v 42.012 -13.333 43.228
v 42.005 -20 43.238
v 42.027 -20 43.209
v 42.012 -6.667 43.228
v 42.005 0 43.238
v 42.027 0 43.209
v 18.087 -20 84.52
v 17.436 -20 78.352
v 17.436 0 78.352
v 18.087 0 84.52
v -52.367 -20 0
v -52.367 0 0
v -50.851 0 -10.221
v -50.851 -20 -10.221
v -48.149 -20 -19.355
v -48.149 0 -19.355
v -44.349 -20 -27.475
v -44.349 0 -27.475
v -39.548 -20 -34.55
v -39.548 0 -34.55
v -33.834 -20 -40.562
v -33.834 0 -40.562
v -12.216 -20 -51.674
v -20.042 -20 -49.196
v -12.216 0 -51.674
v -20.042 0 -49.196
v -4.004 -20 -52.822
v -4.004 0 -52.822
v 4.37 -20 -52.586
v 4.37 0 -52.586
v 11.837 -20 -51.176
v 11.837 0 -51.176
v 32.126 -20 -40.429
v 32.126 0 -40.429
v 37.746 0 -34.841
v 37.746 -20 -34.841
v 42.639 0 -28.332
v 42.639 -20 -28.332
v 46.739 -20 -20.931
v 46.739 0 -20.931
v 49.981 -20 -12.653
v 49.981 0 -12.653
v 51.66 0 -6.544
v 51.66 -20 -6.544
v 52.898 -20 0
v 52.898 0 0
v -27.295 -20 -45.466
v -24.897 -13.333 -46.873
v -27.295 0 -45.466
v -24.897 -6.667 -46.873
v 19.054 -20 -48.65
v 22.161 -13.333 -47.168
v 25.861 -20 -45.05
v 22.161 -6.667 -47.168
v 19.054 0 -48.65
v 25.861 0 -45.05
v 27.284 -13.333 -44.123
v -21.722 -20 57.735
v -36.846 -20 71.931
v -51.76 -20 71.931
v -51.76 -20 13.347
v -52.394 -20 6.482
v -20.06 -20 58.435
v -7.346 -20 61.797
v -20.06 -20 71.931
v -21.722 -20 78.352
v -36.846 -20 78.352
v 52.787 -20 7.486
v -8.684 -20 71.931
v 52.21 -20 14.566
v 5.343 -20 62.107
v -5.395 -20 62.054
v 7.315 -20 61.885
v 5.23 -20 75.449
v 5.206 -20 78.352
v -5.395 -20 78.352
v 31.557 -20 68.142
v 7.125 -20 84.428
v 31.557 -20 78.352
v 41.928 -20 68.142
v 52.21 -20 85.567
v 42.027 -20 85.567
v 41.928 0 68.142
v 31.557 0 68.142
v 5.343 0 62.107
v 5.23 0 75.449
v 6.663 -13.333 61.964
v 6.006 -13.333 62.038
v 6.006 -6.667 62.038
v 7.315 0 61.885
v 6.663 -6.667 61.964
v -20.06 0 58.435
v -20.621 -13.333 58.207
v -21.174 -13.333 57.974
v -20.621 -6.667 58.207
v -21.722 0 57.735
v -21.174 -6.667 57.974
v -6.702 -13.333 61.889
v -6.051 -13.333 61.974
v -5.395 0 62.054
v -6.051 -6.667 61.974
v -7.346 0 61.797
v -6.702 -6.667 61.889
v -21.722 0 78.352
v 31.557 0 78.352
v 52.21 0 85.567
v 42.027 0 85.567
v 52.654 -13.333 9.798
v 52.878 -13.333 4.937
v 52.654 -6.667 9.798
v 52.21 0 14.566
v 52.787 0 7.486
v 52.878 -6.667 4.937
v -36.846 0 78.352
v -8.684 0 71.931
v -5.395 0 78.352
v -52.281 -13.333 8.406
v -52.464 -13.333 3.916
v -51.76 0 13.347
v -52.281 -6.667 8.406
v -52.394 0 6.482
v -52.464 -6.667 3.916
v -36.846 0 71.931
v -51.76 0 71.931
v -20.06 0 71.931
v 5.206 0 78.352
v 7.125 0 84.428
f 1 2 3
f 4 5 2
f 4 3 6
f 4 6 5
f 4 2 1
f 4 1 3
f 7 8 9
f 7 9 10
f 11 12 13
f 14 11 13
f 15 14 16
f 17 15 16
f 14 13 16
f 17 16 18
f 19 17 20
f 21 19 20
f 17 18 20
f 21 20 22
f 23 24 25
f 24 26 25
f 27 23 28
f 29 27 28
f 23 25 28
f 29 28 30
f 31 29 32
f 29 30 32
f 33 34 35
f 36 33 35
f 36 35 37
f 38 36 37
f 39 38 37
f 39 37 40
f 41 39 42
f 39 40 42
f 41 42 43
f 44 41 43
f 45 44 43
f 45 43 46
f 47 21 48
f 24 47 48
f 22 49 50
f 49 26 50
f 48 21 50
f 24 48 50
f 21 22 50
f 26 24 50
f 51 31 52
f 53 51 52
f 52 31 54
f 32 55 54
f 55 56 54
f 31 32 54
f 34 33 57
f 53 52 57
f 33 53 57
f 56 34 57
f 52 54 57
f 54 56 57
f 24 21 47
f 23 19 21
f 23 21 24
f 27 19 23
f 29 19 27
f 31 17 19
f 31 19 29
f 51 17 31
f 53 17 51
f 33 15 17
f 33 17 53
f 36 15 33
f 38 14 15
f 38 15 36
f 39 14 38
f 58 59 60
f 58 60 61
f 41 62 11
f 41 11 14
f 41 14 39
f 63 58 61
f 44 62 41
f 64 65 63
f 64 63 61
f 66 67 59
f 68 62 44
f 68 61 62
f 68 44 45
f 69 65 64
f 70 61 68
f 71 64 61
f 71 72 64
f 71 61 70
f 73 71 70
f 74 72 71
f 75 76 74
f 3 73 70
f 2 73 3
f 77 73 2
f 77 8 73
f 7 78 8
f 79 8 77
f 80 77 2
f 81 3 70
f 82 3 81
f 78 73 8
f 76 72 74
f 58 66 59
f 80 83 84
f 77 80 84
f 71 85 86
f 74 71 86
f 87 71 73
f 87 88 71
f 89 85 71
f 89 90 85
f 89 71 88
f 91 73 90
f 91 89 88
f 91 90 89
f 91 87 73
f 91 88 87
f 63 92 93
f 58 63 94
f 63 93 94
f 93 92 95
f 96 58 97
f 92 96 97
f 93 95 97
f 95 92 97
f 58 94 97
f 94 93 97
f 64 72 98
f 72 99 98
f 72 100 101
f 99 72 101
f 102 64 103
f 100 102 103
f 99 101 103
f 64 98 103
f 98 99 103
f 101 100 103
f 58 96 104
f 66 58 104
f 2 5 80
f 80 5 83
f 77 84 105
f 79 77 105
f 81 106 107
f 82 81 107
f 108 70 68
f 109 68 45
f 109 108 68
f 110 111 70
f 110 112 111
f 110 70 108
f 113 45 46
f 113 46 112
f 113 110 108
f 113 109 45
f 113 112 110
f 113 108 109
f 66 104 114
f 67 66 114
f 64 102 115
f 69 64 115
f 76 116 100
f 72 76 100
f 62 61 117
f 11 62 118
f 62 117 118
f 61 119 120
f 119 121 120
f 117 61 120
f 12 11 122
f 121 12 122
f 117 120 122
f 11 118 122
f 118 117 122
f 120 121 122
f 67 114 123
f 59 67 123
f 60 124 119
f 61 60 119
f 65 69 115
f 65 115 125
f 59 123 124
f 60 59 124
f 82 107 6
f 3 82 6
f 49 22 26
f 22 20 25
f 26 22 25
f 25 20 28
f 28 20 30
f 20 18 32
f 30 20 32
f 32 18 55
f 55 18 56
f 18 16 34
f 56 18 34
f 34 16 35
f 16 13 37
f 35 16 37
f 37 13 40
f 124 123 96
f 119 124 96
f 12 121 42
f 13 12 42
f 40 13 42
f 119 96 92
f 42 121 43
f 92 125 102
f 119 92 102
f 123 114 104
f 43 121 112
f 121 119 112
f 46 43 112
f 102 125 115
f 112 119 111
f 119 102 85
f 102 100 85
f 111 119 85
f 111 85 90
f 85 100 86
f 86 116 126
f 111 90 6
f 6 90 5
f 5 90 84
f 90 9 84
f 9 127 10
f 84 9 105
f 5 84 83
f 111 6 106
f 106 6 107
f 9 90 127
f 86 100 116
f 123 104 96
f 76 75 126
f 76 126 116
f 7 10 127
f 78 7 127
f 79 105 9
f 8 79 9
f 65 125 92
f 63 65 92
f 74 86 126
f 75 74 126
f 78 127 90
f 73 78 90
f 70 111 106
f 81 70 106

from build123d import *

# Parameters (mm, degrees)
F1_DEPTH = 20


with BuildPart() as f1:
    # F0 (on Front) → F1 (new body)
    with BuildSketch(Plane.XZ):
        with BuildLine():
            add(Edge.make_bspline(
                [(-21.722318, 57.734935), (-27.859297, 55.015494), (-32.833372, 51.301815), (-36.846273, 47.016584)],
                knots=[14.887886, 14.887886, 14.887886, 14.887886, 29.996616, 29.996616, 29.996616, 29.996616], degree=3))
            add(Edge.make_bspline(
                [(-36.846273, 47.016584), (-46.12578, 37.107336), (-50.265626, 24.14184), (-51.760266, 13.346677)],
                knots=[29.996616, 29.996616, 29.996616, 29.996616, 64.934324, 64.934324, 64.934324, 64.934324], degree=3))
            add(Edge.make_bspline(
                [(-51.760266, 13.346677), (-52.469743, 8.222425), (-52.583197, 3.587195), (-52.367426, 0)],
                knots=[64.934324, 64.934324, 64.934324, 64.934324, 81.518569, 81.518569, 81.518569, 81.518569], degree=3))
            add(Edge.make_bspline(
                [(-52.367426, 0), (-46.65998, -69.867425), (42.291667, -71.193181), (52.897733, 0)],
                knots=[0, 0, 0, 0, 105.265159, 105.265159, 105.265159, 105.265159], degree=3))
            add(Edge.make_bspline(
                [(52.210338, 14.565944), (52.768483, 9.85171), (52.974558, 4.967478), (52.897733, 0)],
                knots=[69.220725, 69.220725, 69.220725, 69.220725, 81.860246, 81.860246, 81.860246, 81.860246], degree=3))
            add(Edge.make_bspline(
                [(42.026516, 43.20865), (47.814994, 35.242619), (50.93367, 25.34899), (52.210338, 14.565944)],
                knots=[40.309872, 40.309872, 40.309872, 40.309872, 69.220725, 69.220725, 69.220725, 69.220725], degree=3))
            Line((42.026516, 43.20865), (42.026516, 36.341667))
            Line((42.026516, 36.341667), (42.005255, 43.237884))
            add(Edge.make_bspline(
                [(31.556576, 53.367701), (35.735048, 50.52724), (39.186175, 47.110795), (42.005255, 43.237884)],
                knots=[26.210335, 26.210335, 26.210335, 26.210335, 40.274494, 40.274494, 40.274494, 40.274494], degree=3))
            add(Edge.make_bspline(
                [(15.536849, 60.358789), (21.786503, 58.784782), (27.087548, 56.405678), (31.556576, 53.367701)],
                knots=[11.168201, 11.168201, 11.168201, 11.168201, 26.210335, 26.210335, 26.210335, 26.210335], degree=3))
            add(Edge.make_bspline(
                [(7.314677, 61.884856), (10.222105, 61.51986), (12.960106, 61.007755), (15.536849, 60.358789)],
                knots=[4.9663, 4.9663, 4.9663, 4.9663, 11.168201, 11.168201, 11.168201, 11.168201], degree=3))
            add(Edge.make_bspline(
                [(5.342527, 62.107149), (6.008411, 62.040455), (6.665764, 61.96632), (7.314677, 61.884856)],
                knots=[3.582089, 3.582089, 3.582089, 3.582089, 4.9663, 4.9663, 4.9663, 4.9663], degree=3))
            add(Edge.make_bspline(
                [(0, 62.473433), (1.839021, 62.402493), (3.619339, 62.27974), (5.342527, 62.107149)],
                knots=[0, 0, 0, 0, 3.582089, 3.582089, 3.582089, 3.582089], degree=3))
            add(Edge.make_bspline(
                [(0, 62.473433), (-1.86111, 62.397991), (-3.658814, 62.256857), (-5.395137, 62.05428)],
                knots=[0, 0, 0, 0, 3.260299, 3.260299, 3.260299, 3.260299], degree=3))
            Line((-5.395137, 62.05428), (-5.395137, 47.016584))
            Line((-5.395137, 47.016584), (-7.346095, 61.797247))
            add(Edge.make_bspline(
                [(-7.346095, 61.797247), (-12.036643, 61.107229), (-16.260302, 59.95632), (-20.060409, 58.435325)],
                knots=[4.497944, 4.497944, 4.497944, 4.497944, 13.546734, 13.546734, 13.546734, 13.546734], degree=3))
            add(Edge.make_bspline(
                [(-20.060409, 58.435325), (-20.623636, 58.209893), (-21.177558, 57.976331), (-21.722318, 57.734935)],
                knots=[13.546734, 13.546734, 13.546734, 13.546734, 14.887886, 14.887886, 14.887886, 14.887886], degree=3))
        make_face()
        with BuildLine():
            Line((-36.846273, 71.931325), (-36.846273, 47.016584))
            add(Edge.make_bspline(
                [(-21.722318, 57.734935), (-27.859297, 55.015494), (-32.833372, 51.301815), (-36.846273, 47.016584)],
                knots=[14.887886, 14.887886, 14.887886, 14.887886, 29.996616, 29.996616, 29.996616, 29.996616], degree=3))
            Line((-21.722318, 57.734935), (-21.722318, 71.931325))
            Line((-21.722318, 71.931325), (-21.722318, 78.35228))
            Line((-21.722318, 78.35228), (-36.846273, 78.35228))
            Line((-36.846273, 78.35228), (-36.846273, 71.931325))
        make_face()
        with BuildLine():
            add(Edge.make_bspline(
                [(-36.846273, 47.016584), (-46.12578, 37.107336), (-50.265626, 24.14184), (-51.760266, 13.346677)],
                knots=[29.996616, 29.996616, 29.996616, 29.996616, 64.934324, 64.934324, 64.934324, 64.934324], degree=3))
            Line((-36.846273, 47.016584), (-36.846273, 71.931325))
            Line((-36.846273, 71.931325), (-51.760266, 71.931325))
            Line((-51.760266, 71.931325), (-51.760266, 13.346677))
        make_face()
        with BuildLine():
            Line((-20.060409, 71.931325), (-20.060409, 58.435325))
            add(Edge.make_bspline(
                [(-7.346095, 61.797247), (-12.036643, 61.107229), (-16.260302, 59.95632), (-20.060409, 58.435325)],
                knots=[4.497944, 4.497944, 4.497944, 4.497944, 13.546734, 13.546734, 13.546734, 13.546734], degree=3))
            Line((-7.346095, 61.797247), (-8.683732, 71.931325))
            Line((-8.683732, 71.931325), (-20.060409, 71.931325))
        make_face()
        with BuildLine():
            add(Edge.make_bspline(
                [(-5.395137, 62.05428), (-6.054265, 61.977379), (-6.704547, 61.891624), (-7.346095, 61.797247)],
                knots=[3.260299, 3.260299, 3.260299, 3.260299, 4.497944, 4.497944, 4.497944, 4.497944], degree=3))
            Line((-7.346095, 61.797247), (-5.395137, 47.016584))
            Line((-5.395137, 47.016584), (-5.395137, 62.05428))
        make_face()
        with BuildLine():
            add(Edge.make_bspline(
                [(42.026516, 43.20865), (47.814994, 35.242619), (50.93367, 25.34899), (52.210338, 14.565944)],
                knots=[40.309872, 40.309872, 40.309872, 40.309872, 69.220725, 69.220725, 69.220725, 69.220725], degree=3))
            Line((52.210338, 14.565944), (52.210338, 85.566789))
            Line((52.210338, 85.566789), (42.026516, 85.566789))
            Line((42.026516, 85.566789), (42.026516, 43.20865))
        make_face()
        with BuildLine():
            Line((-5.395137, 71.931325), (-5.395137, 62.05428))
            add(Edge.make_bspline(
                [(0, 62.473433), (-1.86111, 62.397991), (-3.658814, 62.256857), (-5.395137, 62.05428)],
                knots=[0, 0, 0, 0, 3.260299, 3.260299, 3.260299, 3.260299], degree=3))
            add(Edge.make_bspline(
                [(0, 62.473433), (1.839021, 62.402493), (3.619339, 62.27974), (5.342527, 62.107149)],
                knots=[0, 0, 0, 0, 3.582089, 3.582089, 3.582089, 3.582089], degree=3))
            Line((5.342527, 62.107149), (5.230435, 75.449023))
            Line((5.230435, 75.449023), (5.206043, 78.35228))
            Line((5.206043, 78.35228), (-5.395137, 78.35228))
            Line((-5.395137, 78.35228), (-5.395137, 71.931325))
        make_face()
        with BuildLine():
            Line((42.026516, 36.341667), (42.026516, 43.20865))
            add(Edge.make_bspline(
                [(42.005255, 43.237884), (42.012346, 43.228142), (42.019433, 43.218397), (42.026516, 43.20865)],
                knots=[40.274494, 40.274494, 40.274494, 40.274494, 40.309872, 40.309872, 40.309872, 40.309872], degree=3))
            Line((42.005255, 43.237884), (42.026516, 36.341667))
        make_face()
        with BuildLine():
            add(Edge.make_bspline(
                [(31.556576, 53.367701), (35.735048, 50.52724), (39.186175, 47.110795), (42.005255, 43.237884)],
                knots=[26.210335, 26.210335, 26.210335, 26.210335, 40.274494, 40.274494, 40.274494, 40.274494], degree=3))
            Line((42.005255, 43.237884), (41.928474, 68.14196))
            Line((41.928474, 68.14196), (31.556576, 68.14196))
            Line((31.556576, 68.14196), (31.556576, 53.367701))
        make_face()
        with BuildLine():
            add(Edge.make_bspline(
                [(15.536849, 60.358789), (21.786503, 58.784782), (27.087548, 56.405678), (31.556576, 53.367701)],
                knots=[11.168201, 11.168201, 11.168201, 11.168201, 26.210335, 26.210335, 26.210335, 26.210335], degree=3))
            Line((31.556576, 53.367701), (31.556576, 68.14196))
            Line((31.556576, 68.14196), (31.556576, 78.35228))
            Line((31.556576, 78.35228), (17.436162, 78.35228))
            Line((17.436162, 78.35228), (15.536849, 60.358789))
        make_face()
        with BuildLine():
            Line((7.125281, 84.427975), (7.314677, 61.884856))
            add(Edge.make_bspline(
                [(7.314677, 61.884856), (10.222105, 61.51986), (12.960106, 61.007755), (15.536849, 60.358789)],
                knots=[4.9663, 4.9663, 4.9663, 4.9663, 11.168201, 11.168201, 11.168201, 11.168201], degree=3))
            Line((15.536849, 60.358789), (17.436162, 78.35228))
            Line((17.436162, 78.35228), (18.087206, 84.520072))
            Line((18.087206, 84.520072), (7.125281, 84.427975))
        make_face()
    extrude(amount=F1_DEPTH)


solid = f1.part
